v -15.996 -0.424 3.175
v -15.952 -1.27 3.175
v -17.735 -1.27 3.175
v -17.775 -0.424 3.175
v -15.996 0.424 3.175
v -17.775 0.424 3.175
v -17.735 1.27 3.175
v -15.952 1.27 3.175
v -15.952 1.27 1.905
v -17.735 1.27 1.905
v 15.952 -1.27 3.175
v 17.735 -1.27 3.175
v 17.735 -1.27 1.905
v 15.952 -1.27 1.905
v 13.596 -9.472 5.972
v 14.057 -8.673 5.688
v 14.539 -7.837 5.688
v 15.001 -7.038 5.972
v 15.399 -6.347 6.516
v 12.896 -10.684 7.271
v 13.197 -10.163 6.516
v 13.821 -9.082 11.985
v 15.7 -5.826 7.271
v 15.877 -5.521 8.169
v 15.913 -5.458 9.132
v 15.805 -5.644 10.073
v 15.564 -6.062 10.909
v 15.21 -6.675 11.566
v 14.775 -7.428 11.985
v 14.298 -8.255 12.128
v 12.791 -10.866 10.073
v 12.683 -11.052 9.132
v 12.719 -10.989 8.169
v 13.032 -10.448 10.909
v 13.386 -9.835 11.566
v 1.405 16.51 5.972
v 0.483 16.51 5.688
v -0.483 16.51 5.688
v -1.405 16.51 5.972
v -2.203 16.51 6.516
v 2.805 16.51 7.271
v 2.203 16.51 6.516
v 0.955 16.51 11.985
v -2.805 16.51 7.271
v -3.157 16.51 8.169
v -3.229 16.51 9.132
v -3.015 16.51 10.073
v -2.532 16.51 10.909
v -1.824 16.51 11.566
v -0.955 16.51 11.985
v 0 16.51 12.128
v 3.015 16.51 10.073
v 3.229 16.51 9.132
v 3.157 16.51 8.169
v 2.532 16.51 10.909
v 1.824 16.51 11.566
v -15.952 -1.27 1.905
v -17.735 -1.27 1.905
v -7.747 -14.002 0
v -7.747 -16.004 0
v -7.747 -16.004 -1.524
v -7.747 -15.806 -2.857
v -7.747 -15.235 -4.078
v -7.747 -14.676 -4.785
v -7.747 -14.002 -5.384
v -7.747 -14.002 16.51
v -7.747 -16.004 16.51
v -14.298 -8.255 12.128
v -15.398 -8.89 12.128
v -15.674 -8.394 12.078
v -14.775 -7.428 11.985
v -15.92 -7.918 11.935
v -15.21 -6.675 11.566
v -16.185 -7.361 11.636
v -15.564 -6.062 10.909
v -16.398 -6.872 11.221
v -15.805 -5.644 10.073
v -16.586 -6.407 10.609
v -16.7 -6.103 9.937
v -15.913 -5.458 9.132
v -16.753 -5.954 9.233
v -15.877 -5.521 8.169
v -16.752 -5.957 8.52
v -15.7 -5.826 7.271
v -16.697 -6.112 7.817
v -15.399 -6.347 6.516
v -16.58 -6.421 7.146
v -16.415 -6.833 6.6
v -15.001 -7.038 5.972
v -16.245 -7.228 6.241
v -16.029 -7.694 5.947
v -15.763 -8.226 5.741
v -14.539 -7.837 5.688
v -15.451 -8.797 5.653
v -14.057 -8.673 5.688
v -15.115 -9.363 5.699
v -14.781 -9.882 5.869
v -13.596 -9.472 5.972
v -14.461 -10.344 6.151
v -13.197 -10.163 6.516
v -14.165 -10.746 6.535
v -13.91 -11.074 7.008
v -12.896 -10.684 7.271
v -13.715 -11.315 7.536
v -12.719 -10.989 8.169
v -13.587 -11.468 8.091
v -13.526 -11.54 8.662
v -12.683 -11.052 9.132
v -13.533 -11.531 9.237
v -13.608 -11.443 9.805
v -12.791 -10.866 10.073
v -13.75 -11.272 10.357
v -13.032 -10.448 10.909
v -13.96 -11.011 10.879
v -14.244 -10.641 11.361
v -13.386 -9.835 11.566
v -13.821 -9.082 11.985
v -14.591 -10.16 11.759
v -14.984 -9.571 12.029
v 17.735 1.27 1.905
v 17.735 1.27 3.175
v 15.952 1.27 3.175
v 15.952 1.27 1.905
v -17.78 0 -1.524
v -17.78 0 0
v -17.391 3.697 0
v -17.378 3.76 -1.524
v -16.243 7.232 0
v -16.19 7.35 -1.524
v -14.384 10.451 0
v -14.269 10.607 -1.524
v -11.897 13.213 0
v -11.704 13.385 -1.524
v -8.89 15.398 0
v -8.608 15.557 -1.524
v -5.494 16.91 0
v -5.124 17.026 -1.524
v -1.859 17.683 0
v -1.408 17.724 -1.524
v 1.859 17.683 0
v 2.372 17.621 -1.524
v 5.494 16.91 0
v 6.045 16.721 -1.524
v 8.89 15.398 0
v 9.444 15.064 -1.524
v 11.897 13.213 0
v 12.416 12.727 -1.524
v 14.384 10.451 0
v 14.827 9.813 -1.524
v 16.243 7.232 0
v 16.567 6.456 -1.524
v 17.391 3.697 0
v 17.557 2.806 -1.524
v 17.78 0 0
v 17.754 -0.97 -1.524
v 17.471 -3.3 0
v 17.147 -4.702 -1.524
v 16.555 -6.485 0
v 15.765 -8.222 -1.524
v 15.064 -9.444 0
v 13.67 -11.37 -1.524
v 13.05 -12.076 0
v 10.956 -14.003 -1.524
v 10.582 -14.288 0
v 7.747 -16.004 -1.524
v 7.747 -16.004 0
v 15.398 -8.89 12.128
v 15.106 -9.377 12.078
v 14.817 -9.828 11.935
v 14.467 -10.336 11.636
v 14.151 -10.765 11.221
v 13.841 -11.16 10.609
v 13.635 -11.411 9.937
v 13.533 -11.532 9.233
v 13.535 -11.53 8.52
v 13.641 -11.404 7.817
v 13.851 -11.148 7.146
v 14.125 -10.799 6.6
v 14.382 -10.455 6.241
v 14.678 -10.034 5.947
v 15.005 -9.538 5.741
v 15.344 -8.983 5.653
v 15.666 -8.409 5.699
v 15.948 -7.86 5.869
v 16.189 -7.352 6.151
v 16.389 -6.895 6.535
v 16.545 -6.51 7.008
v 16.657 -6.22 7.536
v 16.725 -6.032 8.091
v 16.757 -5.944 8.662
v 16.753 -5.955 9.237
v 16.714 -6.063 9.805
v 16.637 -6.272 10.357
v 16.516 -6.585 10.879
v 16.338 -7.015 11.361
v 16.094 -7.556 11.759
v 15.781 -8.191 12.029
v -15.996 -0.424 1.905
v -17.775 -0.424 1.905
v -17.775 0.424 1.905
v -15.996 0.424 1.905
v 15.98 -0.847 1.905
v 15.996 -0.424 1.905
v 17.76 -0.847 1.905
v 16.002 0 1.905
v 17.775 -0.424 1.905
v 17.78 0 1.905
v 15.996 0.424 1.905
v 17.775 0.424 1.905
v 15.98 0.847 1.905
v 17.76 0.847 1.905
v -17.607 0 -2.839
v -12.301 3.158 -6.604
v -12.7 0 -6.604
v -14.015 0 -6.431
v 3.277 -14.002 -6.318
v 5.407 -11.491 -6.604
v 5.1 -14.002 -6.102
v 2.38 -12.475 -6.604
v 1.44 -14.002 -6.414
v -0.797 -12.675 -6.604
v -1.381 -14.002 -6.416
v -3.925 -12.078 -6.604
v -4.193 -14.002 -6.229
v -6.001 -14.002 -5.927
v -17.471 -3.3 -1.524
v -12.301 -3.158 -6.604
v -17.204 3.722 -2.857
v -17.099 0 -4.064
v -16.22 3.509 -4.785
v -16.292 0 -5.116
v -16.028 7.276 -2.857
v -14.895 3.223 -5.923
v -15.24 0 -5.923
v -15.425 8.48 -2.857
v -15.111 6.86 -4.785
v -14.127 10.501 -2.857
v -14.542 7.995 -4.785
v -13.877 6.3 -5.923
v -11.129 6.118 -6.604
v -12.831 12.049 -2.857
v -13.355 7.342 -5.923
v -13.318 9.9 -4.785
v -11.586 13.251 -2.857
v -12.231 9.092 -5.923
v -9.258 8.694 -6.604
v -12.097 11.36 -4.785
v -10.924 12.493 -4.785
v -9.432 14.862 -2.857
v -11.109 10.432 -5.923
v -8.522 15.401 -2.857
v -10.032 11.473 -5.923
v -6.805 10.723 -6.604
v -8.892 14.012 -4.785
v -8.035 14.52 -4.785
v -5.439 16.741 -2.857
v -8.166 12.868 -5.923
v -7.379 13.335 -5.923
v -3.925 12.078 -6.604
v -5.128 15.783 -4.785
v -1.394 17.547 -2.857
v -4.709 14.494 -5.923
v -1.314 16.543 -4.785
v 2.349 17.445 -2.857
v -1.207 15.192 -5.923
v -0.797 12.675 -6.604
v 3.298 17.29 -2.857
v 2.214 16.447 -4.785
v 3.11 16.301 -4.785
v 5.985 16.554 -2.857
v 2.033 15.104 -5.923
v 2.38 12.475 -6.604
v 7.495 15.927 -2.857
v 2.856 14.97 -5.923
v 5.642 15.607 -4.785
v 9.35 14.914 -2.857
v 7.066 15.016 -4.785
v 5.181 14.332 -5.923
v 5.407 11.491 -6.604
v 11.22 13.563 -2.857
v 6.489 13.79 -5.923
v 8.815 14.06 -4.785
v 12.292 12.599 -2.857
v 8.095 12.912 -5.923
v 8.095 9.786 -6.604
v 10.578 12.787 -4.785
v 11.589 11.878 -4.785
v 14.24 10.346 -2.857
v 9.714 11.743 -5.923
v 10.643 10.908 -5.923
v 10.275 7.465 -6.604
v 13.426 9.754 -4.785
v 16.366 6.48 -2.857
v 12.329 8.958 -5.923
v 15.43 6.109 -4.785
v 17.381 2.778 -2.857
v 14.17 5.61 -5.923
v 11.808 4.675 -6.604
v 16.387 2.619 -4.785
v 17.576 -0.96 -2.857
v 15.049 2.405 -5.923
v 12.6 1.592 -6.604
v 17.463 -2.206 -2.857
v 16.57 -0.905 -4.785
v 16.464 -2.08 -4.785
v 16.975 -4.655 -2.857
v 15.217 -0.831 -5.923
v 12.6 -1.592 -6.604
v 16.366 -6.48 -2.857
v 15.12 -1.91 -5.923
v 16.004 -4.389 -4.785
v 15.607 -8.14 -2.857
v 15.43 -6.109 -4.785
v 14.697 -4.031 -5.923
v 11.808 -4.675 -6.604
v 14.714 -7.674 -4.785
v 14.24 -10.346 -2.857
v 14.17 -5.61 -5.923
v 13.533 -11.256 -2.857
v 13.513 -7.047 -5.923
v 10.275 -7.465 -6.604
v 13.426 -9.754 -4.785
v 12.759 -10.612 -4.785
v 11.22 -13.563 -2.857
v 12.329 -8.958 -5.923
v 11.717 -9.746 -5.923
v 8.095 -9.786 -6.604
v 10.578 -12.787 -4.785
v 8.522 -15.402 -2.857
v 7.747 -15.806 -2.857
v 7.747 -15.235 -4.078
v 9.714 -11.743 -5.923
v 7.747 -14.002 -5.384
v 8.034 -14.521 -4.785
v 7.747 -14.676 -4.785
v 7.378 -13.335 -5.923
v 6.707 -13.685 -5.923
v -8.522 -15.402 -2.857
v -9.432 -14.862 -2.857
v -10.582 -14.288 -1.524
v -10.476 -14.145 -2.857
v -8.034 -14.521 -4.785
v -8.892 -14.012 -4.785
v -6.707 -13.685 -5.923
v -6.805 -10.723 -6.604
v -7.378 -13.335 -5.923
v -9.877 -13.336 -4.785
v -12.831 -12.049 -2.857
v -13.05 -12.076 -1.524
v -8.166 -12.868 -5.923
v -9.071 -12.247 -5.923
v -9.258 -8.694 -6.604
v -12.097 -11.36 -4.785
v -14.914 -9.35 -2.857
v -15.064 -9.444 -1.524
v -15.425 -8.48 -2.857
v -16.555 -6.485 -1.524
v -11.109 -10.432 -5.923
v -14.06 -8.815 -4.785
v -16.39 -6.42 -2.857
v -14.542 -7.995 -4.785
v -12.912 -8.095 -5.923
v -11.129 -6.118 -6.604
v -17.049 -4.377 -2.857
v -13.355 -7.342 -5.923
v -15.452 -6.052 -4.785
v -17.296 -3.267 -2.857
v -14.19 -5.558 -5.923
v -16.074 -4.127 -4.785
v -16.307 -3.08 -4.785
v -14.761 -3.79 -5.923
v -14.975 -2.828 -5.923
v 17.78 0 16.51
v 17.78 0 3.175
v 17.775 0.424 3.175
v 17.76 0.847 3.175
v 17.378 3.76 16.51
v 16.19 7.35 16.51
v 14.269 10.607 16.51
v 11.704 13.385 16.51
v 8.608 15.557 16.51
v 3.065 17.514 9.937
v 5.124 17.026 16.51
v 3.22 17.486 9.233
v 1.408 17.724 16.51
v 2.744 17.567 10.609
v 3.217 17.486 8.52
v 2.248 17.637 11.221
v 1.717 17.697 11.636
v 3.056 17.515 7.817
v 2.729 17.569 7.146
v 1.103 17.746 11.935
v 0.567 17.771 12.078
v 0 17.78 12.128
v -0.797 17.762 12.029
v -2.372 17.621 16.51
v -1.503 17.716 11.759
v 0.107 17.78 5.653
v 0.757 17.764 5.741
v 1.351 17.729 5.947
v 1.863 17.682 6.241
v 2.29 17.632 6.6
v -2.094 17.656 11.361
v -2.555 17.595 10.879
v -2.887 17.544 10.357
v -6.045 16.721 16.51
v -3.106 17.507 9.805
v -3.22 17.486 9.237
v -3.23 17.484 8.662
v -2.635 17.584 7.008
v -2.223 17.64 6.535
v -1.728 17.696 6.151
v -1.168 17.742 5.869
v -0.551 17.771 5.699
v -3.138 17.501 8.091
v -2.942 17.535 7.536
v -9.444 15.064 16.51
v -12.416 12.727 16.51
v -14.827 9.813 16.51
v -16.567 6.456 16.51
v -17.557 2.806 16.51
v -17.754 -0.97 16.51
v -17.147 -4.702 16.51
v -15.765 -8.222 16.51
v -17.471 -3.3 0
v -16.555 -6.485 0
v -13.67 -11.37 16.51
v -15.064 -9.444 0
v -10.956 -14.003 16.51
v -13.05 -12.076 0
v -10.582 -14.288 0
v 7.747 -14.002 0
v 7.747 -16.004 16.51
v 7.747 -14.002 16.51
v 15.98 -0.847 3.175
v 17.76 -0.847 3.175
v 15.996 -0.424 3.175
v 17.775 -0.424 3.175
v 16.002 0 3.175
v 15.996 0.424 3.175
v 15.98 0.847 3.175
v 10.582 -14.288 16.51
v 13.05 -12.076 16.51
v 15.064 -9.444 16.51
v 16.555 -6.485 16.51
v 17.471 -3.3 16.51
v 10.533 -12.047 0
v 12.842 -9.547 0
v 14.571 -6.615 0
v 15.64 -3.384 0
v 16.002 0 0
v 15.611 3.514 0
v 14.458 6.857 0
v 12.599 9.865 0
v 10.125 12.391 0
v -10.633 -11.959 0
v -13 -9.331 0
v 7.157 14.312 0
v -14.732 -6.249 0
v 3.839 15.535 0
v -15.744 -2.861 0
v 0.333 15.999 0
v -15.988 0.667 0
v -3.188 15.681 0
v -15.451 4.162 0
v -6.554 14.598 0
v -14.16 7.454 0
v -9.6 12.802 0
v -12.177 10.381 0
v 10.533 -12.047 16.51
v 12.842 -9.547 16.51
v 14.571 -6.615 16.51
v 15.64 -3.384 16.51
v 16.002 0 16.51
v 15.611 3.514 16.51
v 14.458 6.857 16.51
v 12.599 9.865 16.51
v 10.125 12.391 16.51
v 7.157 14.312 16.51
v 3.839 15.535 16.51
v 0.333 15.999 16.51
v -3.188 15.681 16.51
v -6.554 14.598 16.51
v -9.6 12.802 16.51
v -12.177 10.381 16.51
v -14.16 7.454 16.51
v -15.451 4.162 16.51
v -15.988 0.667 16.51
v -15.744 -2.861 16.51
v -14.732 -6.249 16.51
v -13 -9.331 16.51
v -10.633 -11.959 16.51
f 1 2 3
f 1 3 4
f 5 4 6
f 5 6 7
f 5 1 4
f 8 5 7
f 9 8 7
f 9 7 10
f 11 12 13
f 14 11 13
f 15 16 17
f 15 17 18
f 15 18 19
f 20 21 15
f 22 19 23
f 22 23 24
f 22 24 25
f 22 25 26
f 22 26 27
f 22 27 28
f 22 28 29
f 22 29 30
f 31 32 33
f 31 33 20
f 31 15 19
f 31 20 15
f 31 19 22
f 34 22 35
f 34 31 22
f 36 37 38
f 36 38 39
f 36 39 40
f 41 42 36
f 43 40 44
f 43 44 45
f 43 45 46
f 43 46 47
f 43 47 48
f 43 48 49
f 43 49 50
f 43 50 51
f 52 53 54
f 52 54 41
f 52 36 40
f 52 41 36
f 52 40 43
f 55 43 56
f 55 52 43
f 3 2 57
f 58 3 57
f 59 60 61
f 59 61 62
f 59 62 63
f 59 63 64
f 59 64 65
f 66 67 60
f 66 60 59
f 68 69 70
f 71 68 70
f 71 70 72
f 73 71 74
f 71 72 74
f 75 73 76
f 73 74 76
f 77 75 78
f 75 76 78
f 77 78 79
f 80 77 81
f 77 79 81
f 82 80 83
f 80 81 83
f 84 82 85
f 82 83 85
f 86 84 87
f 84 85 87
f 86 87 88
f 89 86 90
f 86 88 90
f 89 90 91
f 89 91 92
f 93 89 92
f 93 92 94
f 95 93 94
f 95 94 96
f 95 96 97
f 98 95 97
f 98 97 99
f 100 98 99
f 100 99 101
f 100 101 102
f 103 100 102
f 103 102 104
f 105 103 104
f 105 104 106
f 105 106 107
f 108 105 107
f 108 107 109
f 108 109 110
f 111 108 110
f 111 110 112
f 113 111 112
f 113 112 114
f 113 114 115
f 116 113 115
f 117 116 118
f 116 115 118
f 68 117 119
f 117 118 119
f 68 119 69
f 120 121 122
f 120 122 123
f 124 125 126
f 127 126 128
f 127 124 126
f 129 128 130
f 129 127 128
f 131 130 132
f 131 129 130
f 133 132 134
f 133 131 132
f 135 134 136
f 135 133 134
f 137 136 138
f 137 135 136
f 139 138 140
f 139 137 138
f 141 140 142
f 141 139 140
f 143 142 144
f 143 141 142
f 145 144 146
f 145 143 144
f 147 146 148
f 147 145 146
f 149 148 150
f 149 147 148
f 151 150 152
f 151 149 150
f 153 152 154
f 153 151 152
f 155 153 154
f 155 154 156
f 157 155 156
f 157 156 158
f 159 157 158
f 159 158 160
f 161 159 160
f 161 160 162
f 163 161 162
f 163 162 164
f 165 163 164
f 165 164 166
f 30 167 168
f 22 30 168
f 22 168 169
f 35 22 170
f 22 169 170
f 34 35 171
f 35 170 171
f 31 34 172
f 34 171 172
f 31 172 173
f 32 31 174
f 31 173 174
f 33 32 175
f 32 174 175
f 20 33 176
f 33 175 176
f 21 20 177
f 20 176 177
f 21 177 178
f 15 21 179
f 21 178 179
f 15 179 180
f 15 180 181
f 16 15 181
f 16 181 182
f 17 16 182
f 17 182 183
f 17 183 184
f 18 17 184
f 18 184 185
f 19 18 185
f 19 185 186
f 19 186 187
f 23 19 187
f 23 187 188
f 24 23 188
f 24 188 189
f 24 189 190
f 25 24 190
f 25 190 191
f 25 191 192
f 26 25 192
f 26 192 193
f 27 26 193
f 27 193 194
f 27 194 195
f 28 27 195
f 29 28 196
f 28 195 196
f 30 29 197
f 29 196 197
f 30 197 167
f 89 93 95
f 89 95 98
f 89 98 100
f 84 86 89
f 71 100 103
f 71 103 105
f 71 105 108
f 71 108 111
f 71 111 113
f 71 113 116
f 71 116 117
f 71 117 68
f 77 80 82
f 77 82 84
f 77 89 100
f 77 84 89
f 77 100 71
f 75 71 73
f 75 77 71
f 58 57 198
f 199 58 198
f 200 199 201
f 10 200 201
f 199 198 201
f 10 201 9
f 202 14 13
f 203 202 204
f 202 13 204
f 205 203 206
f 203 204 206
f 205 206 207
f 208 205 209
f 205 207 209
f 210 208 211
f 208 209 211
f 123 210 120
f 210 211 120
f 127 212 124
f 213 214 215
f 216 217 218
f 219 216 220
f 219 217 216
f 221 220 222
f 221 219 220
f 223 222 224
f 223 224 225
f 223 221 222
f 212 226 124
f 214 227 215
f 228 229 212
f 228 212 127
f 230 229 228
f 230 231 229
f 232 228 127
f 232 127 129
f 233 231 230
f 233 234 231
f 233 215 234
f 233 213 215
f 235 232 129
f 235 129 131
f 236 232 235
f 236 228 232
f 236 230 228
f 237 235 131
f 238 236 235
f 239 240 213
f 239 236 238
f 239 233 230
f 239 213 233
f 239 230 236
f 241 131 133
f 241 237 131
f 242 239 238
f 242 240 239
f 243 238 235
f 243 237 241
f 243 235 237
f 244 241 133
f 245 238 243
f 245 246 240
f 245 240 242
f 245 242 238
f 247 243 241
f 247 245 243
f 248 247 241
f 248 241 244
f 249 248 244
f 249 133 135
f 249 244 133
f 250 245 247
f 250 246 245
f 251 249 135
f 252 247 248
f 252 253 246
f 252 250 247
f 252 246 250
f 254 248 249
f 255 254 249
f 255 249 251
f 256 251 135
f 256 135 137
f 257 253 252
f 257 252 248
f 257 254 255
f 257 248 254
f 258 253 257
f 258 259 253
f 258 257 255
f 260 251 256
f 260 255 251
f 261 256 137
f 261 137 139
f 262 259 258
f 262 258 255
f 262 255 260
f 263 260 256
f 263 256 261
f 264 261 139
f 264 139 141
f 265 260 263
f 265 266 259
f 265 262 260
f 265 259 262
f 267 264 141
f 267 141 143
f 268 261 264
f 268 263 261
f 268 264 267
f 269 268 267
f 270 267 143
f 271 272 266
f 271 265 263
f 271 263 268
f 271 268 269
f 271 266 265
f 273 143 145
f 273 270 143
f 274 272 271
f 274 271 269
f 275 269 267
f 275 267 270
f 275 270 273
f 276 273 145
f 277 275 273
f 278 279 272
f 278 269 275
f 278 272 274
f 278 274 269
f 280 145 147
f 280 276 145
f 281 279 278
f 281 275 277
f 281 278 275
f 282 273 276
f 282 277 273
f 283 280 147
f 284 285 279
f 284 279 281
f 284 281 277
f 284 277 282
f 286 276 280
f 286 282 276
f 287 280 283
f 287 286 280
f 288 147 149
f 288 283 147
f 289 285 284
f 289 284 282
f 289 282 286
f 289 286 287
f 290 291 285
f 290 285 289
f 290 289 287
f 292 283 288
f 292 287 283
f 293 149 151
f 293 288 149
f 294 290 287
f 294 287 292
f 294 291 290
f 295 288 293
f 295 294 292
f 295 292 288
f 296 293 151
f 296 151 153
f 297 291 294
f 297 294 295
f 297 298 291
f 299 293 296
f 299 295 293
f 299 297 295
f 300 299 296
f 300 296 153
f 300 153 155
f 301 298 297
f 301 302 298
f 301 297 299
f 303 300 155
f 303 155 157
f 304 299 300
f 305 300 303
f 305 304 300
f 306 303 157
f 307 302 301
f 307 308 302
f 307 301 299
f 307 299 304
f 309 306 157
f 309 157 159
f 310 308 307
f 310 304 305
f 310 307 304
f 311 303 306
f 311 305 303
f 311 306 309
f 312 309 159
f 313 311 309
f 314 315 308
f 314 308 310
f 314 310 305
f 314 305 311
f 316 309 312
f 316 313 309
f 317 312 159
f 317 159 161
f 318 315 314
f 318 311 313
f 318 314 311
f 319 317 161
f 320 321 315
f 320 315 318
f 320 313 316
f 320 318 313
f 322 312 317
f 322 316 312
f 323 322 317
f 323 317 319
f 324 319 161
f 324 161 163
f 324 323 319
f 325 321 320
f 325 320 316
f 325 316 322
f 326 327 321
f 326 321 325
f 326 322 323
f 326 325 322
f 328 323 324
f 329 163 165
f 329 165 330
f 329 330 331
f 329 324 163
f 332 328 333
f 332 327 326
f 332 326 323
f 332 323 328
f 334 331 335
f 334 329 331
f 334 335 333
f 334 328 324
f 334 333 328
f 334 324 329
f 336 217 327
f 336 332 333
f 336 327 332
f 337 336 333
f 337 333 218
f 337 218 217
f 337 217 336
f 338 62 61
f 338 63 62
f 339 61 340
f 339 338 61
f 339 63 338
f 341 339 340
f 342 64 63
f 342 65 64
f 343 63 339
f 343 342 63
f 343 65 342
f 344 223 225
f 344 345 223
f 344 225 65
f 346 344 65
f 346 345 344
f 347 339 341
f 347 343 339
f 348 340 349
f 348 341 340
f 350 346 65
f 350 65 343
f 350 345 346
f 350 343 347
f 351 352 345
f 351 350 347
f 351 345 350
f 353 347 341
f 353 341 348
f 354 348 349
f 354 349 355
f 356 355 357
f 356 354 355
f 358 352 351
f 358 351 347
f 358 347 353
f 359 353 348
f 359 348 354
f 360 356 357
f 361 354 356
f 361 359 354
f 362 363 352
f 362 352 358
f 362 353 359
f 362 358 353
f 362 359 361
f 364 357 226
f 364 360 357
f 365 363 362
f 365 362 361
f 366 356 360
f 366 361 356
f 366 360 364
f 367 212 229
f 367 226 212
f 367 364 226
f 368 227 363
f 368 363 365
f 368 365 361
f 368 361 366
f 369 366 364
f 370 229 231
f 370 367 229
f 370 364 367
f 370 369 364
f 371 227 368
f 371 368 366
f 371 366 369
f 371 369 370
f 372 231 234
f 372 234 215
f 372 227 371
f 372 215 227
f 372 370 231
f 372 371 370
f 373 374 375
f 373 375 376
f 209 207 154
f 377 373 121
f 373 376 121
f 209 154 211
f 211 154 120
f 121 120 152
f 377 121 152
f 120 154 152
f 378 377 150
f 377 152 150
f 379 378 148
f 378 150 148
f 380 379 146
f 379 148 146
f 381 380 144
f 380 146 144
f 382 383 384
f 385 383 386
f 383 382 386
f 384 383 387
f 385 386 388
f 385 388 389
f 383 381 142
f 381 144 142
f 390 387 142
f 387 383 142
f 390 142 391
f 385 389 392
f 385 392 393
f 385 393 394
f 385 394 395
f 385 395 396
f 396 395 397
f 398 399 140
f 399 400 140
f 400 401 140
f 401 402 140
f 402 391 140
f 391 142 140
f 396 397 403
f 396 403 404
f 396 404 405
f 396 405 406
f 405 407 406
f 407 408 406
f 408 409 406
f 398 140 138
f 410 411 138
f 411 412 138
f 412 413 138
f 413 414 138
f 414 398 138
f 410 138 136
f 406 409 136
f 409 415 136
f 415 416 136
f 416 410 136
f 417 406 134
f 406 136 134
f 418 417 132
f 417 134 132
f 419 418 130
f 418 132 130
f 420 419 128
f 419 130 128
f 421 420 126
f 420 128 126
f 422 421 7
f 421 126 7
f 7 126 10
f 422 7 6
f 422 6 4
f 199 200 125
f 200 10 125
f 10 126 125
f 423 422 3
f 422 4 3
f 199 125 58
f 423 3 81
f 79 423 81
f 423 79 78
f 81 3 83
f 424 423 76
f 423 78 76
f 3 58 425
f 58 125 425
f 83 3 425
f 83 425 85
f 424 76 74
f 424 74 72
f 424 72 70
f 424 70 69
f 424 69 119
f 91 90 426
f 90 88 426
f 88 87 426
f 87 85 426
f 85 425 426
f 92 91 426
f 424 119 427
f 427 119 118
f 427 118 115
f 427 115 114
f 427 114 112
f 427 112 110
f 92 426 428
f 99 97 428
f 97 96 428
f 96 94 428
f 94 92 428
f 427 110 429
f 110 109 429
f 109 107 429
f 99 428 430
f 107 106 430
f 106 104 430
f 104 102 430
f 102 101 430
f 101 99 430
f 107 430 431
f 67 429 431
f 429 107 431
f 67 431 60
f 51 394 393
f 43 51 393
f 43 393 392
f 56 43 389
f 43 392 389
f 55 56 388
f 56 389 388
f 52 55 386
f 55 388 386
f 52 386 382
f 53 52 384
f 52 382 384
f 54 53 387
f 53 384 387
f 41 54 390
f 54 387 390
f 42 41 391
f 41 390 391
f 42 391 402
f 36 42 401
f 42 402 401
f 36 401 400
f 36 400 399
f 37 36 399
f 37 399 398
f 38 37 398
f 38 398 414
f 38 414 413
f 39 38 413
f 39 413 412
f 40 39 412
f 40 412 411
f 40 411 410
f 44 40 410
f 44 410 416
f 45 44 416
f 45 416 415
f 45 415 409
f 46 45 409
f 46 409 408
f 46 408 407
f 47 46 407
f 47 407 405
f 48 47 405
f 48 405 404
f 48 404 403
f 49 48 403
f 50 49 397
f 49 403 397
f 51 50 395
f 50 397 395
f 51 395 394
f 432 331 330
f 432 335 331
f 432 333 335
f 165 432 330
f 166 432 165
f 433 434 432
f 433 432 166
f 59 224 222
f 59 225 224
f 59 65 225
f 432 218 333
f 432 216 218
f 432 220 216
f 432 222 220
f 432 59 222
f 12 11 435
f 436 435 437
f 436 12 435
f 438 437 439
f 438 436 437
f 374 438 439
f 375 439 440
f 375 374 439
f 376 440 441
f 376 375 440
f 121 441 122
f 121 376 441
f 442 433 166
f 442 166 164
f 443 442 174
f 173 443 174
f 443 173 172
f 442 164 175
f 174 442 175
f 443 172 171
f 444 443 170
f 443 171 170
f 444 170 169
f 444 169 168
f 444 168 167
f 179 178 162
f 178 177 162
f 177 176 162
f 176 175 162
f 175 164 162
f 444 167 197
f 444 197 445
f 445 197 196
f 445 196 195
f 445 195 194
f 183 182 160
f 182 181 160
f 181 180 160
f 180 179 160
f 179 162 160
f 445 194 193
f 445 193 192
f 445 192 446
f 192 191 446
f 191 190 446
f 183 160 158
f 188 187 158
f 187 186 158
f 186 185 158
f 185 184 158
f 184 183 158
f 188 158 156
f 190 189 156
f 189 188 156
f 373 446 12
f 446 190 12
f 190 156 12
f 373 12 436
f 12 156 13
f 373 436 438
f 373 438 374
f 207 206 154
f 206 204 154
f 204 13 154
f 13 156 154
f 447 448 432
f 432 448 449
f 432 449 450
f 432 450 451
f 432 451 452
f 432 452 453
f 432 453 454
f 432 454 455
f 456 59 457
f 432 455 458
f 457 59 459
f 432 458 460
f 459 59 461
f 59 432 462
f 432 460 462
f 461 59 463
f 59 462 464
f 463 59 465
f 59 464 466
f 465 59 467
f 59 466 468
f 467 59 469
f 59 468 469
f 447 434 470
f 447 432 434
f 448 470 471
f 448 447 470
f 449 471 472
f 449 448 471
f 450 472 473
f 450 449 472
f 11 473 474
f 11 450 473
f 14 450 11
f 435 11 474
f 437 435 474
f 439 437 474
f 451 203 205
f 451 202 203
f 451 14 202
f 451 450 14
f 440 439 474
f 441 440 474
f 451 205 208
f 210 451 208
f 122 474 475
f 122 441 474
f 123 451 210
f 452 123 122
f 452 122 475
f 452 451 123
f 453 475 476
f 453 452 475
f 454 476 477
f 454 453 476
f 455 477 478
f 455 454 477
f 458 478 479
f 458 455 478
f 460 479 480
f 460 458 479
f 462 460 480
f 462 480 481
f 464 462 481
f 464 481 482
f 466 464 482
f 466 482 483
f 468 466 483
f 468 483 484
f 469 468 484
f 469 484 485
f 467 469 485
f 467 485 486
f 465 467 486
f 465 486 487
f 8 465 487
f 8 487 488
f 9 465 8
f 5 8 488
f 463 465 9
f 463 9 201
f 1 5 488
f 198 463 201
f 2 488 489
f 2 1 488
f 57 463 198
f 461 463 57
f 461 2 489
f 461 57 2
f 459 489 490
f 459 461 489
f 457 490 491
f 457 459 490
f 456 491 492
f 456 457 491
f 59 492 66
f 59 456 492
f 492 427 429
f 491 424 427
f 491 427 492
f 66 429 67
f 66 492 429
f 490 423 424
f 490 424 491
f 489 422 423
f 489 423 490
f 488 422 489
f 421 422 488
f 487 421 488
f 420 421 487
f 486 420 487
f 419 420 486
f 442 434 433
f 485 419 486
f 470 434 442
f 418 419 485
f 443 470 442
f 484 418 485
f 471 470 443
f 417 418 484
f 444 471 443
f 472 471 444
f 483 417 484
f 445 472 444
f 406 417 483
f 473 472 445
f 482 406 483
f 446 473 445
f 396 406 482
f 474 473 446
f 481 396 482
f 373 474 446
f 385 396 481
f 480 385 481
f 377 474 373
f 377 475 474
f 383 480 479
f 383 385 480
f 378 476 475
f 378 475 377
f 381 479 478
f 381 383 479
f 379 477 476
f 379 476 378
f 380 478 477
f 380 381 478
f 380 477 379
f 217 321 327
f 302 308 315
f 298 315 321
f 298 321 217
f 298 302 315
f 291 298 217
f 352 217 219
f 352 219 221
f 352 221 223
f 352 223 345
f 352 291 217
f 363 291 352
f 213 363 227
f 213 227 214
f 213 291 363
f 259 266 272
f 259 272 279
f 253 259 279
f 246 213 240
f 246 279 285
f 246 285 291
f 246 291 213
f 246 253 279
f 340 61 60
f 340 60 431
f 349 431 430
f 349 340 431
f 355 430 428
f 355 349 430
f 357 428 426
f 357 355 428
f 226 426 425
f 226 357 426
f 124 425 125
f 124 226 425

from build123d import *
from build123d.topology import SkipClean

# Parameters (mm, degrees)
SKETCH1_R           = 17.78
SKETCH1_R_2         = 16.002
BOSS_EXTRUDE1_DEPTH = 16.51
BOSS_EXTRUDE2_START = 6.604
SKETCH2_R           = 17.78
BOSS_EXTRUDE2_DEPTH = 6.604
FILLET1_R           = 5.08
SKETCH3_R           = 3.2385
CUT_EXTRUDE1_DEPTH  = 1.27
CIRPATTERN1_COUNT   = 3
CUT_EXTRUDE4_DEPTH  = 35.154264787
SKETCH7_W           = 1.27
SKETCH7_H           = 2.54
CUT_EXTRUDE5_DEPTH  = 44.049066354


with BuildPart() as part:
    # Sketch1 → Boss-Extrude1 (new body)
    with BuildSketch(Plane.XY):
        Circle(SKETCH1_R)
        Circle(SKETCH1_R_2, mode=Mode.SUBTRACT)
    extrude(amount=BOSS_EXTRUDE1_DEPTH)

    # Sketch2 → Boss-Extrude2 (add)
    with BuildSketch(Plane(origin=(0, 0, 0), x_dir=(-1, 0, 0), z_dir=(0, 0, -1)).offset(BOSS_EXTRUDE2_START)):
        Circle(SKETCH2_R)
    extrude(amount=-BOSS_EXTRUDE2_DEPTH)

    # Fillet1
    fillet1_edges = [part.edges().sort_by_distance(p)[0] for p in [
        (17.78, 0, -6.604),
    ]]
    fillet(fillet1_edges, radius=FILLET1_R)

    # Sketch3 → Cut-Extrude1 (cut)
    with BuildSketch(Plane(origin=(0, 17.78, 0), x_dir=(1, 0, 0), z_dir=(0, 1, 0))):
        with Locations(Location((0, -8.89, 0), (0, 0, 270))):
            Circle(SKETCH3_R)
    cut_extrude1 = extrude(amount=-CUT_EXTRUDE1_DEPTH, mode=Mode.SUBTRACT)

    # CirPattern1: Cut-Extrude1 ×3 about axis
    cirpattern1_axis = Axis((0, 0, 0), (0, 0, 1))
    for i in range(1, CIRPATTERN1_COUNT):
        add(cut_extrude1.rotate(cirpattern1_axis, i * 360 / CIRPATTERN1_COUNT), mode=Mode.SUBTRACT)

    # Sketch6 → Cut-Extrude4 (cut, through all)
    with SkipClean():  # the faces are left unmerged after this step: merging them gives an invalid solid
        with BuildSketch(Plane.XY.offset(16.51)):
            with BuildLine():
                Line((-7.747, -16.003511833), (-7.747, -14.001714002))
                Line((-7.747, -14.001714002), (7.747, -14.001714002))
                Line((7.747, -14.001714002), (7.747, -16.003511833))
                ThreePointArc((7.747, -16.003511833), (0, -17.78), (-7.747, -16.003511833))
            make_face()
        extrude(amount=-CUT_EXTRUDE4_DEPTH, mode=Mode.SUBTRACT)

    # Sketch7 → Cut-Extrude5 (cut, through all)
    with SkipClean():  # the faces are left unmerged after this step: merging them gives an invalid solid
        with BuildSketch(Plane(origin=(17.78, 0, 0), x_dir=(0, 0, -1), z_dir=(1, 0, 0))):
            with Locations((-2.54, 0)):
                Rectangle(SKETCH7_W, SKETCH7_H)
        extrude(amount=-CUT_EXTRUDE5_DEPTH, mode=Mode.SUBTRACT)


solid = part.part
